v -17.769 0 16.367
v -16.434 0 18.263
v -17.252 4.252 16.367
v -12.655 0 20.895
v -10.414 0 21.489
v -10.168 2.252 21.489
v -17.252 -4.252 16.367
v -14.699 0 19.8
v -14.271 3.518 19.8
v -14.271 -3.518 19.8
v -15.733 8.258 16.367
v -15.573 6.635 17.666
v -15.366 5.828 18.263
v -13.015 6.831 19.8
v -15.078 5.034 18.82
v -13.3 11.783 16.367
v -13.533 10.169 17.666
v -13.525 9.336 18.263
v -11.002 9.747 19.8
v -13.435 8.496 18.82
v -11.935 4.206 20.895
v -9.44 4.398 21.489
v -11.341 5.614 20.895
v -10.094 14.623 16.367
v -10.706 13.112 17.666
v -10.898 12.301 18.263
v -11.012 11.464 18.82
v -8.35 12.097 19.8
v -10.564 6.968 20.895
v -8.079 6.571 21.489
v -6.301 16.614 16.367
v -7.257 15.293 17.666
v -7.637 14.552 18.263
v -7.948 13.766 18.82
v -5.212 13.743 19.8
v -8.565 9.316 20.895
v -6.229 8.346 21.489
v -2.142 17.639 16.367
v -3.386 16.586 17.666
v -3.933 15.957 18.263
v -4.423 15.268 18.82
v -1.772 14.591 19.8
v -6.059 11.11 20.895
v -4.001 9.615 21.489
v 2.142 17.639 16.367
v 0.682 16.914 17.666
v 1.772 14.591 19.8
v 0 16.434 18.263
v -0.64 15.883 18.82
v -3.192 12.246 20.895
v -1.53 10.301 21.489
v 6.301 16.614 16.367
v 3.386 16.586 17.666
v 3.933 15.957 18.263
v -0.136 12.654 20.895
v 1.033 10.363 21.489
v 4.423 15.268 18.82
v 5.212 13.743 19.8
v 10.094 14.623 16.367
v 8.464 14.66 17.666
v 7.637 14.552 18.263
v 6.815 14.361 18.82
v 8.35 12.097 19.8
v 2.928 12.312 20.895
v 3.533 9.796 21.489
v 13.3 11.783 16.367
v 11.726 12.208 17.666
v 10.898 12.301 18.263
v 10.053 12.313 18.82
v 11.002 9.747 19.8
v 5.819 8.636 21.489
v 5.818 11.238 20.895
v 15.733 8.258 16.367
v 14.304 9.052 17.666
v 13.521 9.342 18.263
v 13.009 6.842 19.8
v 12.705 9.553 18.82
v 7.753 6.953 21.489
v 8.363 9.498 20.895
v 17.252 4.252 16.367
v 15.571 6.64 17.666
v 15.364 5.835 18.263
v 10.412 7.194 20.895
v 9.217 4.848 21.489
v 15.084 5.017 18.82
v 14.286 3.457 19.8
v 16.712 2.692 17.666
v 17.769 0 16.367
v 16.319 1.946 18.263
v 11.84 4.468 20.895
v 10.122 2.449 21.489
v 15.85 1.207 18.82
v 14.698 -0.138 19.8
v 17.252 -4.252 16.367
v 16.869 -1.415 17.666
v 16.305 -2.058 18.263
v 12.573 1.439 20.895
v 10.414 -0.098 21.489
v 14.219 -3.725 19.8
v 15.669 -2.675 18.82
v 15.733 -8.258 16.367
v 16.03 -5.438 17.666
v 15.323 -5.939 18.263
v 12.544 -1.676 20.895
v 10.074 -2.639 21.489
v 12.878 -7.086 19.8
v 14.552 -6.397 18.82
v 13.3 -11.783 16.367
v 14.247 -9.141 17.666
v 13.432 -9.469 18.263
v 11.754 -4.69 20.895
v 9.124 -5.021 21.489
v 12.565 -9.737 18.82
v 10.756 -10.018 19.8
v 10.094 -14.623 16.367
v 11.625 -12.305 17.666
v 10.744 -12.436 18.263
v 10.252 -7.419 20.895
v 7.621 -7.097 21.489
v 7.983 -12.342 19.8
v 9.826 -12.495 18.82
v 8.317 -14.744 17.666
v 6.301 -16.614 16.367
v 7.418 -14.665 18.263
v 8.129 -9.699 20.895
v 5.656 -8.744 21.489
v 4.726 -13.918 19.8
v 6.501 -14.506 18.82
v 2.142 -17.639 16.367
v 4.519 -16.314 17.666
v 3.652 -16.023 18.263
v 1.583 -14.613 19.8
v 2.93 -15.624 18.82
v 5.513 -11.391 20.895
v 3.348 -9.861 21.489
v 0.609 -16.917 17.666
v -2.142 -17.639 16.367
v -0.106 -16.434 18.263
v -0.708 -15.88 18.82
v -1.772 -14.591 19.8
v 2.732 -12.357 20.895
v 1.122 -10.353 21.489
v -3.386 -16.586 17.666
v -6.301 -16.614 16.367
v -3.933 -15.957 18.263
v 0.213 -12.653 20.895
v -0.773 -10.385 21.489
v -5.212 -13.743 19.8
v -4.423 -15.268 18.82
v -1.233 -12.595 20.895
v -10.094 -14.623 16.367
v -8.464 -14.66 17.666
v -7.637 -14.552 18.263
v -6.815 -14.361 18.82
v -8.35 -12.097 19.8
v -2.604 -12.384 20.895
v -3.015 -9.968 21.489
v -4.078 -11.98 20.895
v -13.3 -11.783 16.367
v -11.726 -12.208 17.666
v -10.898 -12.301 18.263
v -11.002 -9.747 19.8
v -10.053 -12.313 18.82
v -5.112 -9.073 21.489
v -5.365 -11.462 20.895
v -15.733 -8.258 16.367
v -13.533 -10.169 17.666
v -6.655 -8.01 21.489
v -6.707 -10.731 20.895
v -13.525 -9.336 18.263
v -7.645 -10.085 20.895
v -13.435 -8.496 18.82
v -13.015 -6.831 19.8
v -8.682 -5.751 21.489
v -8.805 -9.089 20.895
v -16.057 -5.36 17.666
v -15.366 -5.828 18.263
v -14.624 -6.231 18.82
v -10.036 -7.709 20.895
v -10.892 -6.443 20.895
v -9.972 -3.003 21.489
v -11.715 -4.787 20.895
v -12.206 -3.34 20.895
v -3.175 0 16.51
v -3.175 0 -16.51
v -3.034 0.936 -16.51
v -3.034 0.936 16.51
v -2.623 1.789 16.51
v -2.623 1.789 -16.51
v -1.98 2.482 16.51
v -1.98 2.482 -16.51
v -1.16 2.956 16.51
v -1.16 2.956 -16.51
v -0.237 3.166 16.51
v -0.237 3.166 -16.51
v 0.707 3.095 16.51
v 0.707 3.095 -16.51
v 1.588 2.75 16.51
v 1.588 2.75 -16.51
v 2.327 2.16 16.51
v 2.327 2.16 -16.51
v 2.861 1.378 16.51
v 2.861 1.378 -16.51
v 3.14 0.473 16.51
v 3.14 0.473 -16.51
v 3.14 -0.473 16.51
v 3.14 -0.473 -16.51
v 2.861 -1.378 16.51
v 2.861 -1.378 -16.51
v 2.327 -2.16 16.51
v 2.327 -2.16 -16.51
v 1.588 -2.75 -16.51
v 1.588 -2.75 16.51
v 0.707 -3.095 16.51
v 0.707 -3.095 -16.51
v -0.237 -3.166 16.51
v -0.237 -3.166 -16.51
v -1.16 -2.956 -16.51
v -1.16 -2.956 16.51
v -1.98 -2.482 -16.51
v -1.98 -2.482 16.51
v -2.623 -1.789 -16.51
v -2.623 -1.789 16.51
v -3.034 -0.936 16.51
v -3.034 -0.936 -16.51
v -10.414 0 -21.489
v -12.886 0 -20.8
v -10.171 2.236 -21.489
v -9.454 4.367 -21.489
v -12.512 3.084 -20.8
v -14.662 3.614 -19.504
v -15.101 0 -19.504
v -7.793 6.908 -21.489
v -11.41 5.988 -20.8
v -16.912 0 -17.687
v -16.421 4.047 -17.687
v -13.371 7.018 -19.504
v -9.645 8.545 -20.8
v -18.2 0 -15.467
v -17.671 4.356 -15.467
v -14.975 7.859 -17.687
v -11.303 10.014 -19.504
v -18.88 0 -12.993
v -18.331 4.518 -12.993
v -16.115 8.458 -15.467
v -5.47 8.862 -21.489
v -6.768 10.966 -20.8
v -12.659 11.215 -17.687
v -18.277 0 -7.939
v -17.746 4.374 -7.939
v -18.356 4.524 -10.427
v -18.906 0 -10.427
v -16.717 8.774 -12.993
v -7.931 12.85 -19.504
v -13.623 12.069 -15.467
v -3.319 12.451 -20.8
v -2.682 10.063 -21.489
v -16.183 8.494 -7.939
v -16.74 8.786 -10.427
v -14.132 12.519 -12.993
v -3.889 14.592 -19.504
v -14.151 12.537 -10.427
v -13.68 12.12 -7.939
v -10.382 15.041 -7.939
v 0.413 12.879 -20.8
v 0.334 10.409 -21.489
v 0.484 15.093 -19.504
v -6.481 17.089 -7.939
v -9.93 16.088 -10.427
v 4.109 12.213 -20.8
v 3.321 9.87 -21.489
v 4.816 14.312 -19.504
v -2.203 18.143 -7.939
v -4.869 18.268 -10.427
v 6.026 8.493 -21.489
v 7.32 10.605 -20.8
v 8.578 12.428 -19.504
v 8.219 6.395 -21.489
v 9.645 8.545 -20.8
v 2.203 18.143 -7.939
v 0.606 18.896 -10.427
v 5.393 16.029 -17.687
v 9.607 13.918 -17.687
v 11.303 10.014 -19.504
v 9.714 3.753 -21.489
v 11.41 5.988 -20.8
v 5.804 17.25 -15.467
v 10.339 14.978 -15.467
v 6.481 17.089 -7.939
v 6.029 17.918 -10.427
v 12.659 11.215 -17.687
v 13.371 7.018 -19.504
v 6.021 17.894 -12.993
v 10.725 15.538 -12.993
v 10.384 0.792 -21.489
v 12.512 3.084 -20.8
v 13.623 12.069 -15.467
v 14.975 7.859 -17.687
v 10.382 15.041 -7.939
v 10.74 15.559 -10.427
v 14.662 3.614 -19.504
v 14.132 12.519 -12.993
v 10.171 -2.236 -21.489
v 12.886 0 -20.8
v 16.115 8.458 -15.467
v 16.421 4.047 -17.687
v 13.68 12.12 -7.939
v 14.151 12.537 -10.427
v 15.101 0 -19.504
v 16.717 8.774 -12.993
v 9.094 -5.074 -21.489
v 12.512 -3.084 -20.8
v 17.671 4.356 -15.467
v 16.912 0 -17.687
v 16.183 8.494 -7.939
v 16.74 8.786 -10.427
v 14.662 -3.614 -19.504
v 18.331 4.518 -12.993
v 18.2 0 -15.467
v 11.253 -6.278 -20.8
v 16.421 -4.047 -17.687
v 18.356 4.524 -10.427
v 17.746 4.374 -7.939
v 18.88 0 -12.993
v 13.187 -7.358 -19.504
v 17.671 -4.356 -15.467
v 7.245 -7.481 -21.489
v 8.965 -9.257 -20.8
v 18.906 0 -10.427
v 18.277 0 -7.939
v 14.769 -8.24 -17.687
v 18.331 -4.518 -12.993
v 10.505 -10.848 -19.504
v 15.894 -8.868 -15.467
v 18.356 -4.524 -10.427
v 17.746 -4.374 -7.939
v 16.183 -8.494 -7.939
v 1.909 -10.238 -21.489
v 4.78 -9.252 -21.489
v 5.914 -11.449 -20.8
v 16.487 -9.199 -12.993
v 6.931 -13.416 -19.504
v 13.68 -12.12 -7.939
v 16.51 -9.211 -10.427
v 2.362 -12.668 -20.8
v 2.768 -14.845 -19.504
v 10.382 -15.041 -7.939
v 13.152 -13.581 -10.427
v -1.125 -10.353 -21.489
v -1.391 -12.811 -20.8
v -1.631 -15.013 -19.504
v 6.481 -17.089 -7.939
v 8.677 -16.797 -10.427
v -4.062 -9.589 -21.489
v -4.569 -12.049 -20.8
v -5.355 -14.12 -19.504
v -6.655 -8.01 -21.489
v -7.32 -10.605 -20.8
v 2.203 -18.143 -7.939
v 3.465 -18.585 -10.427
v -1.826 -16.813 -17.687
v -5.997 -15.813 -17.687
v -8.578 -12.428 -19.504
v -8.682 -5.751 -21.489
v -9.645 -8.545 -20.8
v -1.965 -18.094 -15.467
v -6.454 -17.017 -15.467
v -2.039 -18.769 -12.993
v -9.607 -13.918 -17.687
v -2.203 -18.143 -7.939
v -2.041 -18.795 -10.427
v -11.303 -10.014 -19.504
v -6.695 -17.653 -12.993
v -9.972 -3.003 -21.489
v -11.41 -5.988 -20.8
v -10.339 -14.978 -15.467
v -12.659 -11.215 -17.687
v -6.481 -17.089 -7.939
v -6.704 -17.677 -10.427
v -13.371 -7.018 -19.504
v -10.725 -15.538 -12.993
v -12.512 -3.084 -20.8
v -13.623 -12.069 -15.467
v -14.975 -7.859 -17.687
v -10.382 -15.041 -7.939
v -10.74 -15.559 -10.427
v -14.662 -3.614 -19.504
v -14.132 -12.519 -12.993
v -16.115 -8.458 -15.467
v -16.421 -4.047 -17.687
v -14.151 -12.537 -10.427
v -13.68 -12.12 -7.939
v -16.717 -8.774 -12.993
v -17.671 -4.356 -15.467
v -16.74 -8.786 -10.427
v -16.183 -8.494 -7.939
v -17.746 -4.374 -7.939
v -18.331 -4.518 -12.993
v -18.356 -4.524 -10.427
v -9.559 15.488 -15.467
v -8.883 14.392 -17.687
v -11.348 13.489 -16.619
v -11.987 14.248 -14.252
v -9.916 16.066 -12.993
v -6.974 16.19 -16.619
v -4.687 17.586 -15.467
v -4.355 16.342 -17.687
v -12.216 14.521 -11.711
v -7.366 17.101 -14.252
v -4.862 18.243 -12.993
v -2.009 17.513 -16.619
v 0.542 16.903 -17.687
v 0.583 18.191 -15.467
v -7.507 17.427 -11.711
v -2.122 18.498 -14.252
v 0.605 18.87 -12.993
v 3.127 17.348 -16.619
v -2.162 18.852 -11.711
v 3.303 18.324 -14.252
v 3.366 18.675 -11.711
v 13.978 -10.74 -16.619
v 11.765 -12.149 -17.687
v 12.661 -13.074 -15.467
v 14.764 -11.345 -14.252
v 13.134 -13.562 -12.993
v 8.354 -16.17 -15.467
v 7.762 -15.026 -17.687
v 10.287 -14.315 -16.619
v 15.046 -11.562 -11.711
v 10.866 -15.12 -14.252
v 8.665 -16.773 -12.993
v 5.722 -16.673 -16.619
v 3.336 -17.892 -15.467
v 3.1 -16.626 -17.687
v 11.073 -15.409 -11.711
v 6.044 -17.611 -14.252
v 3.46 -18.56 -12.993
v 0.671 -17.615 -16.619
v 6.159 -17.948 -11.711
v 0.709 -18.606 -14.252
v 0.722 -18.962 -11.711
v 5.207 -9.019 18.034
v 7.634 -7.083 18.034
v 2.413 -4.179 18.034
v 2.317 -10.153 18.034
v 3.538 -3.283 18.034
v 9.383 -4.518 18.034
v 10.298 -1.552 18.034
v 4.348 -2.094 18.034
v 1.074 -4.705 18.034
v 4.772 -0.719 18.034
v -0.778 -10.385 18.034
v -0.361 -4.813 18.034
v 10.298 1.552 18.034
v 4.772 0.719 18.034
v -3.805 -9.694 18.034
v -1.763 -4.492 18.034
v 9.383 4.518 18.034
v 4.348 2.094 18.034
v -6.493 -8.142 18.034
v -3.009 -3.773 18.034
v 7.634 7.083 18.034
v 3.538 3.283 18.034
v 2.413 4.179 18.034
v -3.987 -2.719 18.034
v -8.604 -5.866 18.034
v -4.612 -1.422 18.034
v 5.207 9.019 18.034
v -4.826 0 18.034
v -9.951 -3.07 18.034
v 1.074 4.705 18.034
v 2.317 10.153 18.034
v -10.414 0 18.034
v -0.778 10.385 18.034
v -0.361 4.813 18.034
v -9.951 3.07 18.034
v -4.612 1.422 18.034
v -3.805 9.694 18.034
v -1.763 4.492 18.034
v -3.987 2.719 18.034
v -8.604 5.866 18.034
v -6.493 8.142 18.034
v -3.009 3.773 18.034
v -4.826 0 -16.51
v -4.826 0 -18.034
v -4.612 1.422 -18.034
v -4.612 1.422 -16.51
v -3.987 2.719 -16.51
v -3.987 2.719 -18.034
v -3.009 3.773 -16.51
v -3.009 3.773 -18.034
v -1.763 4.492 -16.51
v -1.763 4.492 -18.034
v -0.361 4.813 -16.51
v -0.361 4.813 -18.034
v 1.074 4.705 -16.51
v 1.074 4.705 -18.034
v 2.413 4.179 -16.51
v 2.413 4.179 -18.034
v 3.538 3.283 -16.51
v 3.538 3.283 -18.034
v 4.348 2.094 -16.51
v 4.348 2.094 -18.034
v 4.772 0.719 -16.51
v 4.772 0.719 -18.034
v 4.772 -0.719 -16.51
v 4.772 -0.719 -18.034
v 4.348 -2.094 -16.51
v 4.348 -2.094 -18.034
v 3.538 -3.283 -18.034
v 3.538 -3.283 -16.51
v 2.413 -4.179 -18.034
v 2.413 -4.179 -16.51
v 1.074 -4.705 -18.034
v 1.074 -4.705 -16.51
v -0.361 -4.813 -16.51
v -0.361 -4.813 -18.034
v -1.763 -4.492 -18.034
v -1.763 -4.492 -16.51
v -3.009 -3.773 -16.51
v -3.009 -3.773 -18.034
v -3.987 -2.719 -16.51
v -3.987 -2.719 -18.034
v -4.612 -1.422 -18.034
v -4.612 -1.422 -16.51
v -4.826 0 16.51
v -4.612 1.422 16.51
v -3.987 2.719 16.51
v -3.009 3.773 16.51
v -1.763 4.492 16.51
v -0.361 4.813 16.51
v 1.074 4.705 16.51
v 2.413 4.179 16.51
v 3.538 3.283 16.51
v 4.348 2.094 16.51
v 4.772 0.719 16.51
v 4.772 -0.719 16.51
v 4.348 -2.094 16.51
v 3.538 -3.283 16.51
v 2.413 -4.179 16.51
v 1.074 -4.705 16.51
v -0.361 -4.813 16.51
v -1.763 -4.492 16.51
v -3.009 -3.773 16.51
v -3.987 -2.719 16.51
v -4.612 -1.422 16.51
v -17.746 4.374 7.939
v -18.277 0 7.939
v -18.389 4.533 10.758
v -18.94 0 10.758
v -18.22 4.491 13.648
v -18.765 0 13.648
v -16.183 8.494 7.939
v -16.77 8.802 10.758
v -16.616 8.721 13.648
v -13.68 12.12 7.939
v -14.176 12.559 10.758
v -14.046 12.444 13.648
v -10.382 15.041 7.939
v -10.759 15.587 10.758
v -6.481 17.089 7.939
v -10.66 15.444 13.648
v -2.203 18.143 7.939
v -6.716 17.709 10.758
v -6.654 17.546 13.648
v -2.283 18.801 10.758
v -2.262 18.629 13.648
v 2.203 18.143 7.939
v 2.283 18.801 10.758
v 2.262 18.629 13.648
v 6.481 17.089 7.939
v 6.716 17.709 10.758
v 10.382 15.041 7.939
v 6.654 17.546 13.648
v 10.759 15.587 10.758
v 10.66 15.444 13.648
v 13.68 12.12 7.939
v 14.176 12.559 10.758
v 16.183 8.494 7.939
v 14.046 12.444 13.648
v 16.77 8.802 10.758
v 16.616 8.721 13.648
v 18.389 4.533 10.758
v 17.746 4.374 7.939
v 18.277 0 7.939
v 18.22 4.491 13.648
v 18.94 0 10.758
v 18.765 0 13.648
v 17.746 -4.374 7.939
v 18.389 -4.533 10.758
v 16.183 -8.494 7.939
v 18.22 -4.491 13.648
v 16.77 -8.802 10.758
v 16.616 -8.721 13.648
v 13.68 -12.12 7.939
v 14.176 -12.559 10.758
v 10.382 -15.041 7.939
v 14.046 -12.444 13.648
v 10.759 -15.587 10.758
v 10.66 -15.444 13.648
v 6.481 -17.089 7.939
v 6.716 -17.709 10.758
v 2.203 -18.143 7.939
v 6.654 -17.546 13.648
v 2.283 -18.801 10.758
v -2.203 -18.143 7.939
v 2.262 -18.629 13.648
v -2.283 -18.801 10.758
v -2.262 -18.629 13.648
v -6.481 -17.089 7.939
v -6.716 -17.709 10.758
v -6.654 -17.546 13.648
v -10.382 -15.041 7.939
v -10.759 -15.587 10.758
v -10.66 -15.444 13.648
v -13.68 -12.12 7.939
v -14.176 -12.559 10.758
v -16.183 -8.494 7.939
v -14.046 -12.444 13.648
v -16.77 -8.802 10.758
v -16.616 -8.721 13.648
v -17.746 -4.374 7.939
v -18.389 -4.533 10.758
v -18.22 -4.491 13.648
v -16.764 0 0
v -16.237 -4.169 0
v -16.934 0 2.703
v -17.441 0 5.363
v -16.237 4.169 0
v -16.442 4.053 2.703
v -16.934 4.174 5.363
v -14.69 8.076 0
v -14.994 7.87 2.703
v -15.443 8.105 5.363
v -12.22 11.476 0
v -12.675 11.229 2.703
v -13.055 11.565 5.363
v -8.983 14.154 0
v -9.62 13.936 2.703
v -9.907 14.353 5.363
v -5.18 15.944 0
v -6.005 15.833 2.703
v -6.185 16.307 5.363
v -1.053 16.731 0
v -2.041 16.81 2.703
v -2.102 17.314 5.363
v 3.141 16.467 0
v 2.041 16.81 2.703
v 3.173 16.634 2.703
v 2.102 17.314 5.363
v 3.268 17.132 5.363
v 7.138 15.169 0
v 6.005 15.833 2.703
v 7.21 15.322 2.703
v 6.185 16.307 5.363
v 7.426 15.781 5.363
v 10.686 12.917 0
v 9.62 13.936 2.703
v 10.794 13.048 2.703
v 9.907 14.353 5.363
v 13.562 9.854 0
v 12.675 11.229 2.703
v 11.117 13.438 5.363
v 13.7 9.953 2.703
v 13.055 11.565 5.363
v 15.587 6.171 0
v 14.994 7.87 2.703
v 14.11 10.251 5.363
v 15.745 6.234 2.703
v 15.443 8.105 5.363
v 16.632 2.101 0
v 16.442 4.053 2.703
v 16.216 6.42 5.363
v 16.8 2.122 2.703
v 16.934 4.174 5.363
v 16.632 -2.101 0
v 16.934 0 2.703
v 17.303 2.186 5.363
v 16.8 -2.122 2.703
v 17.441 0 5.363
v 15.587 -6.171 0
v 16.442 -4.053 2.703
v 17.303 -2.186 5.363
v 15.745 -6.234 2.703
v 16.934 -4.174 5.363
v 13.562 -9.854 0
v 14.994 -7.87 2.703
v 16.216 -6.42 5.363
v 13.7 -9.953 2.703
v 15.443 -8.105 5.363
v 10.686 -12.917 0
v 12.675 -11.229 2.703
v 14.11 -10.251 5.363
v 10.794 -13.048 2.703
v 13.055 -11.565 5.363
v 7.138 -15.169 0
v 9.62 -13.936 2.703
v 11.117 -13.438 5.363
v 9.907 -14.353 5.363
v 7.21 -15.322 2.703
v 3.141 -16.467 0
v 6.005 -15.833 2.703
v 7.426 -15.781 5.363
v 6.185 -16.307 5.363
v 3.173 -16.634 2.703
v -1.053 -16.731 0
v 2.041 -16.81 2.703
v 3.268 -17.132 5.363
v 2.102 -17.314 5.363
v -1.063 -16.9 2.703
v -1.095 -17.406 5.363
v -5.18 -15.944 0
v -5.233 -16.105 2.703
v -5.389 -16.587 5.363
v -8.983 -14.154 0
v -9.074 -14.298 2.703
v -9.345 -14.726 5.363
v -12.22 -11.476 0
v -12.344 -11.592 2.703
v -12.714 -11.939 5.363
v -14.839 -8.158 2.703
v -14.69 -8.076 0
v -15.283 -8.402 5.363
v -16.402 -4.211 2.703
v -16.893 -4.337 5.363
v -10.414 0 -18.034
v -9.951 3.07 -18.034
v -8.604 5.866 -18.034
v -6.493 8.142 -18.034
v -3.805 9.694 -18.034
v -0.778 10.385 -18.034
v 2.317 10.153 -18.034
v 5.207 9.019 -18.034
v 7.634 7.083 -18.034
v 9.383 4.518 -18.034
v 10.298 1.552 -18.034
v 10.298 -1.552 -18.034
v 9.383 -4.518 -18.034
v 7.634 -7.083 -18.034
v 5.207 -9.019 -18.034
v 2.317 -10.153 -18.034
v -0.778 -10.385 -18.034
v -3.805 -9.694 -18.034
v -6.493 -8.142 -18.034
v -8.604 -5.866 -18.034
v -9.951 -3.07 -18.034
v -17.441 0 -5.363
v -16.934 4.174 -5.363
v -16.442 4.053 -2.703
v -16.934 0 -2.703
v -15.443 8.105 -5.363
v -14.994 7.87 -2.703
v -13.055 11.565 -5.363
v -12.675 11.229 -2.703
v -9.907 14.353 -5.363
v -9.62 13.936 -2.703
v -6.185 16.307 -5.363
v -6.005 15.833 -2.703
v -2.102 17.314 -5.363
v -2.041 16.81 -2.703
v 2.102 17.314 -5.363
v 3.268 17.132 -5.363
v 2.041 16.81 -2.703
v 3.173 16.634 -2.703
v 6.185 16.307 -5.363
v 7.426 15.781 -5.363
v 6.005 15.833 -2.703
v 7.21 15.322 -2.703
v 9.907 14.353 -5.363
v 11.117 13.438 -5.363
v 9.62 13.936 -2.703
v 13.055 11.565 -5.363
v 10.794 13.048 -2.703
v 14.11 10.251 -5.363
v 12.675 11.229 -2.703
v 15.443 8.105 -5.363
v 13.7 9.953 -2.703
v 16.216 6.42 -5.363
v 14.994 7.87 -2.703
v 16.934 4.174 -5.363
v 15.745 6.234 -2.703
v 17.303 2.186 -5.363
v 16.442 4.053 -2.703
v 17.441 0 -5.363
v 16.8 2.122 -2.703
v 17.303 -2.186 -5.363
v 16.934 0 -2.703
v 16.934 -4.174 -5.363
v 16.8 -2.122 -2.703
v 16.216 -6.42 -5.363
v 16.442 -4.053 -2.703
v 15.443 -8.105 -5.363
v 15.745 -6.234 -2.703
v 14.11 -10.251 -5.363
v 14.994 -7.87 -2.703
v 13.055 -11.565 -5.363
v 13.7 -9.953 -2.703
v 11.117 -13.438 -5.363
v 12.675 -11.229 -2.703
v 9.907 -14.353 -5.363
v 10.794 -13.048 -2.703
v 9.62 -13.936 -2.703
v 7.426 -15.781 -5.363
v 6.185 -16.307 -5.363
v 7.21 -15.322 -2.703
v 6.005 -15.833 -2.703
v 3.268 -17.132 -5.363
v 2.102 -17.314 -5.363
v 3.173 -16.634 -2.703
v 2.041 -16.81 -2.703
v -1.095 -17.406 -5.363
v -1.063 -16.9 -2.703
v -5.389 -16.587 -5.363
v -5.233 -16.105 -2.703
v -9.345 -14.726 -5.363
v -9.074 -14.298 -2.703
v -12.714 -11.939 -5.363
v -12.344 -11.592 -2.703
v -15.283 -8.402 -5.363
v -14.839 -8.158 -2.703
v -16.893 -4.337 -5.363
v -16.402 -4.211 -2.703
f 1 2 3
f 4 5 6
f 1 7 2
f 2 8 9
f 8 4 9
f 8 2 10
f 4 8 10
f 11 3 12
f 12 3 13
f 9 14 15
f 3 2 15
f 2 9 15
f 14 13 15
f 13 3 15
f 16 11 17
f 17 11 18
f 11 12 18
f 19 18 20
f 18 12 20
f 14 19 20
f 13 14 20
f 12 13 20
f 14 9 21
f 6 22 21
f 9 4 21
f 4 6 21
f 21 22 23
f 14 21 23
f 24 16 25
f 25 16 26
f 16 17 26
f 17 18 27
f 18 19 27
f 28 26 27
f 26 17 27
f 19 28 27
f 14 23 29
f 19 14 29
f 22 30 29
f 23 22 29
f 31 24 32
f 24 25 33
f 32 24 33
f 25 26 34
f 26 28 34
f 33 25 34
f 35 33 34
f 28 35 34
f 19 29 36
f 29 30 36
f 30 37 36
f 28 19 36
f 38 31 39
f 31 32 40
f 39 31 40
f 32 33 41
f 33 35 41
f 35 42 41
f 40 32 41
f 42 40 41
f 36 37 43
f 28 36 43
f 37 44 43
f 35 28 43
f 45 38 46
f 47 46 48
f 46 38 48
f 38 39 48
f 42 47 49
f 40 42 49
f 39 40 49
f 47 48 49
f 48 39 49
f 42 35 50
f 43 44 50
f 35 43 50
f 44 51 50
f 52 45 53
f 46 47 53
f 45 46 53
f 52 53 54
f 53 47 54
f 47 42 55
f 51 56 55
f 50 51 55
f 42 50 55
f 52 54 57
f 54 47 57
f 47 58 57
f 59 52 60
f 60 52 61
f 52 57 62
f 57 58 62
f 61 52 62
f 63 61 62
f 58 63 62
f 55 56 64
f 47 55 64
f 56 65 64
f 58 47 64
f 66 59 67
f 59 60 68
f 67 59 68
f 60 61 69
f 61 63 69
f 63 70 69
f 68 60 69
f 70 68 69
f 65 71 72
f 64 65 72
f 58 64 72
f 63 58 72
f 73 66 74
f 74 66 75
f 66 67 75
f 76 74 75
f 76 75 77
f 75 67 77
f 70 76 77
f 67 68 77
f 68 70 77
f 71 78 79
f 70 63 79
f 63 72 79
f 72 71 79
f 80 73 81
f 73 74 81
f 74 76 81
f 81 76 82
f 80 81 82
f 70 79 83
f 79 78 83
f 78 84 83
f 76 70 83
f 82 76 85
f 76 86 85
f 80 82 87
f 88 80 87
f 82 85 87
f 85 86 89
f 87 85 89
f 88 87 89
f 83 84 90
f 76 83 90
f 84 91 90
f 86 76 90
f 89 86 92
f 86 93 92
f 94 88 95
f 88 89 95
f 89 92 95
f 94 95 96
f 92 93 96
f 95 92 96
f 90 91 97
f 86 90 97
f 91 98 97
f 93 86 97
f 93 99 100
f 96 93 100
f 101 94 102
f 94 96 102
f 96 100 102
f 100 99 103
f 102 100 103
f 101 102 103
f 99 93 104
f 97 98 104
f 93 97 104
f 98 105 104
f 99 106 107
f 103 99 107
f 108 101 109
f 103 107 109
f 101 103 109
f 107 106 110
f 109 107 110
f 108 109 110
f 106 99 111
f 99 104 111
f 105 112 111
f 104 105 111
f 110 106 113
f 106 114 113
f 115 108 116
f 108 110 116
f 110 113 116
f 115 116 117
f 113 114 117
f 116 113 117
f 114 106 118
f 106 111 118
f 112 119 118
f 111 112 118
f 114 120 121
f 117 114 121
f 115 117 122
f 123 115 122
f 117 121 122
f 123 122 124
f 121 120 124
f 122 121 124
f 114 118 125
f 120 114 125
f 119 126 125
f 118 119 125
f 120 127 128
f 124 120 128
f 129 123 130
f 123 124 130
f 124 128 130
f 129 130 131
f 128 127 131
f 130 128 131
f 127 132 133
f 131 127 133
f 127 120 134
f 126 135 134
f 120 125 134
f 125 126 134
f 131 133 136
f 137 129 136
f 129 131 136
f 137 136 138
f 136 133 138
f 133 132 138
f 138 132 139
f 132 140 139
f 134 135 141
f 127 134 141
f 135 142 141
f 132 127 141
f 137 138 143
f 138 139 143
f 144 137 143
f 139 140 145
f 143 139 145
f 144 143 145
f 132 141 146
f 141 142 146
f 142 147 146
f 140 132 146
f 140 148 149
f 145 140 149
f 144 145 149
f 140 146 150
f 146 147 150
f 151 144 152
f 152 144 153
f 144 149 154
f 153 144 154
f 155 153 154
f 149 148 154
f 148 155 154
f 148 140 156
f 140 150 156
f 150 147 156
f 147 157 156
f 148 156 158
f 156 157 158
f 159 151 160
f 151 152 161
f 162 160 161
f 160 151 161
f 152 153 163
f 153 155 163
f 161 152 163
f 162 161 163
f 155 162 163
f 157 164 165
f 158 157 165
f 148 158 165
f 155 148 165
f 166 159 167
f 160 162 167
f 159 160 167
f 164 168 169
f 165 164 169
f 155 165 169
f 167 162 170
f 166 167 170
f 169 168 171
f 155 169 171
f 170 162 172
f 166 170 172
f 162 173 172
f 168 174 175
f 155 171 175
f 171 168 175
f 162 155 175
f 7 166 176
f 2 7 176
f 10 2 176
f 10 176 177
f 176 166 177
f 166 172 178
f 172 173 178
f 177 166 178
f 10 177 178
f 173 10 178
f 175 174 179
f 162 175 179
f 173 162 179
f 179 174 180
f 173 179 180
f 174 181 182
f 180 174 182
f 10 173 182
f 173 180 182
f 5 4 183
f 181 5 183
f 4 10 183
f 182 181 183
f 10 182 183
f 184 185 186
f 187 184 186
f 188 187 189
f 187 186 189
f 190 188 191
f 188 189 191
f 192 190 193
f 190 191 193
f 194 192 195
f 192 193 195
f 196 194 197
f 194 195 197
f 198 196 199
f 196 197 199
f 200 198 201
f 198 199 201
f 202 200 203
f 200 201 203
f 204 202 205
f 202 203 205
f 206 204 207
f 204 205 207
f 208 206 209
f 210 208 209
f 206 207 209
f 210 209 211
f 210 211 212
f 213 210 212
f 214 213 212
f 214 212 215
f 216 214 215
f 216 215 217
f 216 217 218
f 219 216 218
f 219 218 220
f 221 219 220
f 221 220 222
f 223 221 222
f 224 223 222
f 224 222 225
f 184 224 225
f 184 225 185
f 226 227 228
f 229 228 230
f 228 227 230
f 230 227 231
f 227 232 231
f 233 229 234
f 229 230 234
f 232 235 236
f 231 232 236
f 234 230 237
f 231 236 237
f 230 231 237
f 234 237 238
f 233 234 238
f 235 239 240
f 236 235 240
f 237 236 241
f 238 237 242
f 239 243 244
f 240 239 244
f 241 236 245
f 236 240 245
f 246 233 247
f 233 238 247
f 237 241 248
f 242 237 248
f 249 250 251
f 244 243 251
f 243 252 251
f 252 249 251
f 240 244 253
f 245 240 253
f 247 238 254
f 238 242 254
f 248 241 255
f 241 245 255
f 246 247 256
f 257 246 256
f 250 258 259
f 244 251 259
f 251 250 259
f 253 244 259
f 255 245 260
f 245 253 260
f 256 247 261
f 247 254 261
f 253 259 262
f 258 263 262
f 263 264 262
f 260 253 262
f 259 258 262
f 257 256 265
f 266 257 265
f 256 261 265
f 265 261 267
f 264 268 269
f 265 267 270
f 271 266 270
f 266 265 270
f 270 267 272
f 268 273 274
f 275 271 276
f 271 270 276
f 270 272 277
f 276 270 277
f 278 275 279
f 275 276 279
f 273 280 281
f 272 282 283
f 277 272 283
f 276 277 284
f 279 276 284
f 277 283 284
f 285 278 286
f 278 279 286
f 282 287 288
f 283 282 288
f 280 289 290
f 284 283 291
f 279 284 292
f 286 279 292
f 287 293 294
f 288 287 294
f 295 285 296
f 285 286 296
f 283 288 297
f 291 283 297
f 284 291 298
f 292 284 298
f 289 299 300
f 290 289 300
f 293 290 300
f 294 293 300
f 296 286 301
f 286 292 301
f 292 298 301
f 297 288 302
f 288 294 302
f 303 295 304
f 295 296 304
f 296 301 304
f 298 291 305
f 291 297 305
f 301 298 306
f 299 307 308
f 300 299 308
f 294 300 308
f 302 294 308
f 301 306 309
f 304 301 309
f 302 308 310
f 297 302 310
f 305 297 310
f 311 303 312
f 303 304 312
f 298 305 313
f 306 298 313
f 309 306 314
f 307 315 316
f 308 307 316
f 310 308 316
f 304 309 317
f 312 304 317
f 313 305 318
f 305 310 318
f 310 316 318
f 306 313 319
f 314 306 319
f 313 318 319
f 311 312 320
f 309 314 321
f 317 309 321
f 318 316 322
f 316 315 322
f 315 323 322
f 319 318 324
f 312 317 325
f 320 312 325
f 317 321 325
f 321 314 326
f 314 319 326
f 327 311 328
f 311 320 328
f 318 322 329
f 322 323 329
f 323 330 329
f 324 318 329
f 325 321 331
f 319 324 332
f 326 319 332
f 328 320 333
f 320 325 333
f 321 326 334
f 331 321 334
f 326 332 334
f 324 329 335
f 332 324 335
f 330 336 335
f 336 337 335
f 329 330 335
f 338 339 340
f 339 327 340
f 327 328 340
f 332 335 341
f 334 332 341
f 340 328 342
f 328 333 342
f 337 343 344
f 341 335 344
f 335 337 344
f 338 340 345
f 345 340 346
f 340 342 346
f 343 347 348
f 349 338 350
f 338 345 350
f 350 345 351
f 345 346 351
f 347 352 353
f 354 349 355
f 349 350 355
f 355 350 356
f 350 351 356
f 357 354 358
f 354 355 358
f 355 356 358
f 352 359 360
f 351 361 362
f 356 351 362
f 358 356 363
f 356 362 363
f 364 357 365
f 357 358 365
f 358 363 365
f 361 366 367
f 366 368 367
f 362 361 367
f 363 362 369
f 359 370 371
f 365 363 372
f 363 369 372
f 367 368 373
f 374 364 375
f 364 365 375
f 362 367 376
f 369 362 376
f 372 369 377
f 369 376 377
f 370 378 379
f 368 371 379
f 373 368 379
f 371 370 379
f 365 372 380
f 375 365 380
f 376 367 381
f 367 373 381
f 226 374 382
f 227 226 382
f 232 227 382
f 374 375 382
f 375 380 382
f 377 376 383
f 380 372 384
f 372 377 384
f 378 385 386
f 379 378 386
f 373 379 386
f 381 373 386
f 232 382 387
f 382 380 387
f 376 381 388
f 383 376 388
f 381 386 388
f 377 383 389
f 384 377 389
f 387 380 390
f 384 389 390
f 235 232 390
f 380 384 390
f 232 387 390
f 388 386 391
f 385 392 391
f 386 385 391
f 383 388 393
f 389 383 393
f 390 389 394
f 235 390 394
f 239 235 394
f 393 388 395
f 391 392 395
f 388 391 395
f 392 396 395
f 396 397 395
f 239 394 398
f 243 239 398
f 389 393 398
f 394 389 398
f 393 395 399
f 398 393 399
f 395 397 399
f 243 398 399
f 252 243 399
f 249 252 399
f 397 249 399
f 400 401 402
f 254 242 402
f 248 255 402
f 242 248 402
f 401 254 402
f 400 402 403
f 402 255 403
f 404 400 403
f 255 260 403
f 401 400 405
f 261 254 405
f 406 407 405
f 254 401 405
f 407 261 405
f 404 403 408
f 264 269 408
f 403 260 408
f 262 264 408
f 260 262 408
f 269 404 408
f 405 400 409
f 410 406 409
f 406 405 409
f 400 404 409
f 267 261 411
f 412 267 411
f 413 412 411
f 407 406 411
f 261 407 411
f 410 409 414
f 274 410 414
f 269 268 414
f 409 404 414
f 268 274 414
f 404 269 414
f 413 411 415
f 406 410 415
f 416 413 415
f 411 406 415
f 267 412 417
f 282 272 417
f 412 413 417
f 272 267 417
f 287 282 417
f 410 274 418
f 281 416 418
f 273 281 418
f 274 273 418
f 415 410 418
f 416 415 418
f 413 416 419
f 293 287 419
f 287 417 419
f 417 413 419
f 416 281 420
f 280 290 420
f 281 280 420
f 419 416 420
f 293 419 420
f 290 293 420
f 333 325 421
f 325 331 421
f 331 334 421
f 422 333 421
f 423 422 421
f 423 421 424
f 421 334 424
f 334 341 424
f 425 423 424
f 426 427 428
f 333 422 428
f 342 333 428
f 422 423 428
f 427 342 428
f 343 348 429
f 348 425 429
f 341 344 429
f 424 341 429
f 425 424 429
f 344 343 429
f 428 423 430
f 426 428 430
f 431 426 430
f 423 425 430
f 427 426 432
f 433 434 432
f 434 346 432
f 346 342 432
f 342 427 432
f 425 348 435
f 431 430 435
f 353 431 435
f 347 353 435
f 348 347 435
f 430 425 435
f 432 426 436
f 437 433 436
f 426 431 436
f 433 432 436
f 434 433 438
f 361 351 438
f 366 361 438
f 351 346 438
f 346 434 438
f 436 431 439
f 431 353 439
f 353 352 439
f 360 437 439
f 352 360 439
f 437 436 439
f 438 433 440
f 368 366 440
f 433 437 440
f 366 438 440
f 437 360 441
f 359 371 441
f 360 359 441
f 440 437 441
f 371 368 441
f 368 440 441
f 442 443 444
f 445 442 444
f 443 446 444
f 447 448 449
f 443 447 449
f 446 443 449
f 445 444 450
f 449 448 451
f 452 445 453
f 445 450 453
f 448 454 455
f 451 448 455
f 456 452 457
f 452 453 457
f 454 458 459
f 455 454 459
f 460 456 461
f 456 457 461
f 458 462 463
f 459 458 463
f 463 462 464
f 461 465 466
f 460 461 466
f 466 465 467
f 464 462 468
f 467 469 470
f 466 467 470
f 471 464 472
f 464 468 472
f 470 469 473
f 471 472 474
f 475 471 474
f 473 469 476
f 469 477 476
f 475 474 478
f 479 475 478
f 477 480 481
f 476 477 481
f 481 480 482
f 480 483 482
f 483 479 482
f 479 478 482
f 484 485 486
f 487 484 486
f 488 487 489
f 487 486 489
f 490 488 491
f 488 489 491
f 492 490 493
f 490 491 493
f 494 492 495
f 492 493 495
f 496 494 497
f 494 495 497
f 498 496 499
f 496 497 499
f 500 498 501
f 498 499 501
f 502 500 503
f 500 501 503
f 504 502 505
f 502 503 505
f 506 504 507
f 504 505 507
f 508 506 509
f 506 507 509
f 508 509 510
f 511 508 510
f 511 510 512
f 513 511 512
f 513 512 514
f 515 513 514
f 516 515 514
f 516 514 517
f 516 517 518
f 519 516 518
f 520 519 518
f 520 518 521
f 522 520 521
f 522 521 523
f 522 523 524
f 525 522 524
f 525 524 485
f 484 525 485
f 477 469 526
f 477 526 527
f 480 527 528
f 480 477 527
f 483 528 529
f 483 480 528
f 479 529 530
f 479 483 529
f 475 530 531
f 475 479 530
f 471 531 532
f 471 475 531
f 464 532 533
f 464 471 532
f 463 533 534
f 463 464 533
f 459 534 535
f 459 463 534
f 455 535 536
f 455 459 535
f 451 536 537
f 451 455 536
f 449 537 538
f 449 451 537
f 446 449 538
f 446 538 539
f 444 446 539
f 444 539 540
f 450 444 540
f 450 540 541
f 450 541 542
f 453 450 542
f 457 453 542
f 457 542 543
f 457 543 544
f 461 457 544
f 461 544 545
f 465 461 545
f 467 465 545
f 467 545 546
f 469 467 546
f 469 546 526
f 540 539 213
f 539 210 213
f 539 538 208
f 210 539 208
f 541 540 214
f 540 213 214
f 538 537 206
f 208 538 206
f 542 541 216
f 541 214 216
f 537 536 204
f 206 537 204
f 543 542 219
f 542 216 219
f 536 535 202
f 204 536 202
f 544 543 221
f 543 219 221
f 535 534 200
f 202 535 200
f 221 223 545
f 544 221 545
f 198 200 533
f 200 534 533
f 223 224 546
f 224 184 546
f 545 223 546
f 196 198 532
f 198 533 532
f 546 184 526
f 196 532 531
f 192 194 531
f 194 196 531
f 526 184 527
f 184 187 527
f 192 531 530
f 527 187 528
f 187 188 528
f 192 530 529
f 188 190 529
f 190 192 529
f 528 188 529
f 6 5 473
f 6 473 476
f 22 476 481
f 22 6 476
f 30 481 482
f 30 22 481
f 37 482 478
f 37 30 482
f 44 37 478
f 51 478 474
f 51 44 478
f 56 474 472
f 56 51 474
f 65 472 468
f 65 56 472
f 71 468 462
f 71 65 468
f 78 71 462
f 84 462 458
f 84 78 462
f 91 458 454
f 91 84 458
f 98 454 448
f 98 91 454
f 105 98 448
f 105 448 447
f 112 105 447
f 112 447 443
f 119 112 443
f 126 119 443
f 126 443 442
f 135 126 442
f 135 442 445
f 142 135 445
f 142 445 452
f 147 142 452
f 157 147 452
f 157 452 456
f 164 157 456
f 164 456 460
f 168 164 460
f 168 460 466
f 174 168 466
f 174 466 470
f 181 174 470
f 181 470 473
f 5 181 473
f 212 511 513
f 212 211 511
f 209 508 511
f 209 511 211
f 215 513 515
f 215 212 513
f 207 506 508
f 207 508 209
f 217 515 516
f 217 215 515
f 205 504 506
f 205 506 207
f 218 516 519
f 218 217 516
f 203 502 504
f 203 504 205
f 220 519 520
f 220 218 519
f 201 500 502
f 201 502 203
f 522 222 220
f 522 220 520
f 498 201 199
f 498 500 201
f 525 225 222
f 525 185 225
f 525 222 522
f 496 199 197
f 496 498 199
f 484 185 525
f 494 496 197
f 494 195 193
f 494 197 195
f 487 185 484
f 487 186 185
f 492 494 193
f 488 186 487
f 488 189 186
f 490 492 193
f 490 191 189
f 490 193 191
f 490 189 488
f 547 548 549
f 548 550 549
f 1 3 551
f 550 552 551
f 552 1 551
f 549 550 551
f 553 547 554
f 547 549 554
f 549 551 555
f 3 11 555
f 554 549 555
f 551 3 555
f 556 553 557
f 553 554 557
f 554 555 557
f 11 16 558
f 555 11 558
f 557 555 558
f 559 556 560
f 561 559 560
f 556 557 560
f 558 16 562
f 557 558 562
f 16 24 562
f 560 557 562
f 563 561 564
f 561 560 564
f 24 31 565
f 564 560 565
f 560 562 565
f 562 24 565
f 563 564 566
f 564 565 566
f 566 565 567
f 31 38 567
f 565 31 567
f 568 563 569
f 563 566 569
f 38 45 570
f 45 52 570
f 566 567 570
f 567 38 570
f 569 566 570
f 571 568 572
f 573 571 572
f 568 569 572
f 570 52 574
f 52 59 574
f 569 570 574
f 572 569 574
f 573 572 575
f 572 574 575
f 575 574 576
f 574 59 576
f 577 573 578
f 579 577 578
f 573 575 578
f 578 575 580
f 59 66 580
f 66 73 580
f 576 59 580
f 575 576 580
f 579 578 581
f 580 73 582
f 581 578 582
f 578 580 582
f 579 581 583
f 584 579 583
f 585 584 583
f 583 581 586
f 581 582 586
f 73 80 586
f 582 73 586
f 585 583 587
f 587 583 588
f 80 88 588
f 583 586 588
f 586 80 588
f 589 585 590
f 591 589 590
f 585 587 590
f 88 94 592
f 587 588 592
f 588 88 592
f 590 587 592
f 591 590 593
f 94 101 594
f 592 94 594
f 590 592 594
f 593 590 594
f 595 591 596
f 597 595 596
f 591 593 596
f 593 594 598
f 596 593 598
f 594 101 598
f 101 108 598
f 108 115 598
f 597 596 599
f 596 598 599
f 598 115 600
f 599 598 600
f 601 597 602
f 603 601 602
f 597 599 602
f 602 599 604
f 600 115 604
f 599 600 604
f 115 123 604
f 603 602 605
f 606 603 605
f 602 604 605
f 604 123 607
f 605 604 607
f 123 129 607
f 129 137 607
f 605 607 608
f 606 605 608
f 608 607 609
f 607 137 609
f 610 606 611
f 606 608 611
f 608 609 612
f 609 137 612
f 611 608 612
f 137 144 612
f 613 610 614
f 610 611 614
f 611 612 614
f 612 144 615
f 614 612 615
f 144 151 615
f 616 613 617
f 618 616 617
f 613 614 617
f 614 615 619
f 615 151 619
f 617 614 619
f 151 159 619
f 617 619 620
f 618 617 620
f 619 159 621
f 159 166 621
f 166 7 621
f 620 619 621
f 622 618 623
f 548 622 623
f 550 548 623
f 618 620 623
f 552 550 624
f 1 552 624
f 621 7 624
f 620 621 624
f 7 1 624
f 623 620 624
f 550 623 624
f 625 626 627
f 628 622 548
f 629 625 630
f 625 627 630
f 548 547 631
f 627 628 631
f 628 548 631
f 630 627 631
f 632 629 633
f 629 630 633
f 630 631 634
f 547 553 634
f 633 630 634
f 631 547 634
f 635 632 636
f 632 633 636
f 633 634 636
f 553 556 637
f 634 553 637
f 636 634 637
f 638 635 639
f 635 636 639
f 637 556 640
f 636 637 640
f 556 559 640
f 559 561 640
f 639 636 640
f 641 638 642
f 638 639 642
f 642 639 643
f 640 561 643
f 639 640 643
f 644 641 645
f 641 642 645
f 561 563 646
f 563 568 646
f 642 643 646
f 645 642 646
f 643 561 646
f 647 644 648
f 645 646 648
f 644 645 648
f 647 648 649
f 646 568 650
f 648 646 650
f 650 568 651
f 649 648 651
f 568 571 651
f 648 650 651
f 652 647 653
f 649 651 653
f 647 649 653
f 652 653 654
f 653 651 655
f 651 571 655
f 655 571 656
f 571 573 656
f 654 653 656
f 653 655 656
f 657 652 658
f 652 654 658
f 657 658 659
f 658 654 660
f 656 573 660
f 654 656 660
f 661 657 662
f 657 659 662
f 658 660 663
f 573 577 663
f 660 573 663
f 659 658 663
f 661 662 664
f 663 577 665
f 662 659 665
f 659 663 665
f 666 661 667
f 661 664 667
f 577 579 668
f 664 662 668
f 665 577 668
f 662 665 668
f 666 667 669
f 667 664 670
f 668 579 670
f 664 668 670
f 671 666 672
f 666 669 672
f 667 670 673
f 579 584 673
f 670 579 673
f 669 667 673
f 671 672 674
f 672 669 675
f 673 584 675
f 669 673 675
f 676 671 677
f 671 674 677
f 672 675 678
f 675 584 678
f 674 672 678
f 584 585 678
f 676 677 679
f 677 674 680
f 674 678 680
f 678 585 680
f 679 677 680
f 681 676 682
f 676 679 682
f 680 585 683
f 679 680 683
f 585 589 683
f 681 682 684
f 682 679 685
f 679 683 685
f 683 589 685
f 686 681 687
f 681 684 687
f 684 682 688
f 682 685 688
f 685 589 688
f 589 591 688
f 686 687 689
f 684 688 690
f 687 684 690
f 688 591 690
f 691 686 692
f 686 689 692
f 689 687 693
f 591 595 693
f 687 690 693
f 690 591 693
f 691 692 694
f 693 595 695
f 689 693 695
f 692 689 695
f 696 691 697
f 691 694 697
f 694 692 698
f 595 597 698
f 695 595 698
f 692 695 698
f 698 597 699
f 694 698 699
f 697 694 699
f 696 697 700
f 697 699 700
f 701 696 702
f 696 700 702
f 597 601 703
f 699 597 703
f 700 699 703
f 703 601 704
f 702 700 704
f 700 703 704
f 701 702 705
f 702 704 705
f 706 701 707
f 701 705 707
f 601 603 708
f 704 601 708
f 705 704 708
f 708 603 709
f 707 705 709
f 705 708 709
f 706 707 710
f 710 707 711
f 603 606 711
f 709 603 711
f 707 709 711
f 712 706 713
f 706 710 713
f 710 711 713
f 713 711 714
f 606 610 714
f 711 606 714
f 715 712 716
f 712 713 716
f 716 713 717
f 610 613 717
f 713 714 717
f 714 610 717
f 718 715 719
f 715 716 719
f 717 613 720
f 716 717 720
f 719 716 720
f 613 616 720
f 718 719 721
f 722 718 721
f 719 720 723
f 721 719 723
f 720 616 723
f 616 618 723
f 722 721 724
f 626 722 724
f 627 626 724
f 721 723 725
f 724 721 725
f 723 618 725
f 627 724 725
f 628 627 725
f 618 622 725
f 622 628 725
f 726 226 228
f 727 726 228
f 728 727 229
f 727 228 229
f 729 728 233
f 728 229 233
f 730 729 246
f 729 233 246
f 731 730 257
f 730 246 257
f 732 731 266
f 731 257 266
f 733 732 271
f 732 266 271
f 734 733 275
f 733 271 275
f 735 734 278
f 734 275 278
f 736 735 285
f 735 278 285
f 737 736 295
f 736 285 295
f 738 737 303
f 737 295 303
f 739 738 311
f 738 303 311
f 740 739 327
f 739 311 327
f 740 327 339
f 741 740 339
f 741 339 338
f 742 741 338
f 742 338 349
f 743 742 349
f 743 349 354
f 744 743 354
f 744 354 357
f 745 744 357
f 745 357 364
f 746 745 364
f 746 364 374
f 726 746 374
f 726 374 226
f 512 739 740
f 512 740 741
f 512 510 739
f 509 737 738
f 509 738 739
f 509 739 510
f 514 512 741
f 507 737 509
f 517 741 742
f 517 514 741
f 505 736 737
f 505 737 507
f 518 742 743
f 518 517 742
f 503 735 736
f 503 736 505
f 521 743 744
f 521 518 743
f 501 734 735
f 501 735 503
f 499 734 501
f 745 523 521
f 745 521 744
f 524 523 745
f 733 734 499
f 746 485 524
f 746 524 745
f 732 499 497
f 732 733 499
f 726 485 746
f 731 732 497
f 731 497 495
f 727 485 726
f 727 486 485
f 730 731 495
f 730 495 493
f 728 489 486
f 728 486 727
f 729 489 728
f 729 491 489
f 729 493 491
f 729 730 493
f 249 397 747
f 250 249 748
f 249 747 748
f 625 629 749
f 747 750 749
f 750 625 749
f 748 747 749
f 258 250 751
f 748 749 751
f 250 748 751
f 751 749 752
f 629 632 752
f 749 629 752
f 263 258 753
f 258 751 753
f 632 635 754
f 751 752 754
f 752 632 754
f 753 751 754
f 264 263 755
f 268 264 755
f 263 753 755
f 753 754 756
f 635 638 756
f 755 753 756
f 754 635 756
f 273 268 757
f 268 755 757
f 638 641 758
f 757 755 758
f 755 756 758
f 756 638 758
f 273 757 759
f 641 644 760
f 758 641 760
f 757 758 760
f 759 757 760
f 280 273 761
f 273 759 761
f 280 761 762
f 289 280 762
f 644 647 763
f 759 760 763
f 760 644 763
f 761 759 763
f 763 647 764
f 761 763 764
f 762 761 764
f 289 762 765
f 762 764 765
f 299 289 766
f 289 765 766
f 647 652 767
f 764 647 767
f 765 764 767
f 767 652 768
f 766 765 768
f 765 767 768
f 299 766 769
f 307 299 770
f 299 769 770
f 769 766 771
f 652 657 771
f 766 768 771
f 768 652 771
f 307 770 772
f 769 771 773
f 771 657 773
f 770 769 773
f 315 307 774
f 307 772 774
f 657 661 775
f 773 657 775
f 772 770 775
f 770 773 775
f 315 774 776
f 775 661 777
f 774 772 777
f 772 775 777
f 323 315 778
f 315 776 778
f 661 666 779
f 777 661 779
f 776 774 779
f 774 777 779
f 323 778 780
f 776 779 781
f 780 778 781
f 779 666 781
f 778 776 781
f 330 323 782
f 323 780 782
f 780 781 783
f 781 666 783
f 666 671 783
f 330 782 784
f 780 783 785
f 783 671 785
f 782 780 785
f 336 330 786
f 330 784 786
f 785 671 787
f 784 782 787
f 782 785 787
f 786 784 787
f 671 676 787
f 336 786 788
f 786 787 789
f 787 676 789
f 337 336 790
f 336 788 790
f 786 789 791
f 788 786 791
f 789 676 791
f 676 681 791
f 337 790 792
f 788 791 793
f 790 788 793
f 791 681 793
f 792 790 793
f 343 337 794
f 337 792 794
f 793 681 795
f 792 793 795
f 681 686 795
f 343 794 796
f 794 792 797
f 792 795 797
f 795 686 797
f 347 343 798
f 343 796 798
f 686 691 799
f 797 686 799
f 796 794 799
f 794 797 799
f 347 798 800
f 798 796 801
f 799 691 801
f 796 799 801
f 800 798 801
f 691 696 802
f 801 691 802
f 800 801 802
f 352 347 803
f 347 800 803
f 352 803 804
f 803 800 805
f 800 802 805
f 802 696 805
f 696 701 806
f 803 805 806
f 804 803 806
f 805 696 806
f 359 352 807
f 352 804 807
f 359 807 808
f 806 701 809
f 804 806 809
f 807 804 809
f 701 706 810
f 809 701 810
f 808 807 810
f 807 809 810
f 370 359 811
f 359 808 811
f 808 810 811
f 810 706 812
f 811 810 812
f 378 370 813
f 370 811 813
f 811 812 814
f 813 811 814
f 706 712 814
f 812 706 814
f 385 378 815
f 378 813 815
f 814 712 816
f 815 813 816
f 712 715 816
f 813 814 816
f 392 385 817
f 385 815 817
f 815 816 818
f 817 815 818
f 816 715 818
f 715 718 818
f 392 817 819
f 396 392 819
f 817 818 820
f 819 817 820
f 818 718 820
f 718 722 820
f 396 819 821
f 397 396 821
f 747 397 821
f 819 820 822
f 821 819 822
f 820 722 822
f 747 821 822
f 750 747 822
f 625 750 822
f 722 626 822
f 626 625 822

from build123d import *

# Parameters (mm, degrees)
SKETCH2_R          = 10.414
SKETCH2_R_2        = 4.826
CUT_EXTRUDE1_DEPTH = 3.556
SKETCH2_3_R        = 4.826
SKETCH2_3_R_2      = 3.175
CUT_EXTRUDE2_DEPTH = 5.08
SKETCH2_4_R        = 3.175
CUT_EXTRUDE3_DEPTH = 51.839793437


with BuildPart() as part:
    # Sketch1 → Revolve1 (revolve)
    with BuildSketch(Plane(origin=(0, 0, 0), x_dir=(1, 0, 0), z_dir=(0, 1, 0))):
        with BuildLine():
            Line((-8.99509488, -21.59), (0, -21.59))
            Line((0, -21.59), (0, 21.59))
            Line((0, 21.59), (-8.99509488, 21.59))
            ThreePointArc((-8.99509488, 21.59), (-17.248826294, 17.221029702), (-18.27665112, 7.939027771))
            ThreePointArc((-18.27665112, 7.939027771), (-17.145533974, 4.040924256), (-16.764, 0))
            ThreePointArc((-16.764, 0), (-17.145533974, -4.040924256), (-18.27665112, -7.939027771))
            ThreePointArc((-18.27665112, -7.939027771), (-18.957860852, -12.209538391), (-17.768742698, -16.367338972))
            ThreePointArc((-17.768742698, -16.367338972), (-14.100314862, -20.185516743), (-8.99509488, -21.59))
        make_face()
    revolve(axis=Axis((0, 0, 21.59), (0, 0, -1)))

    # Sketch2 → Cut-Extrude1 (cut)
    with BuildSketch(Plane(origin=(0, 0, -21.59), x_dir=(-1, 0, 0), z_dir=(0, 0, -1))):
        Circle(SKETCH2_R)
        Circle(SKETCH2_R_2, mode=Mode.SUBTRACT)
    cut_extrude1 = extrude(amount=-CUT_EXTRUDE1_DEPTH, mode=Mode.SUBTRACT)

    # Sketch2<3> → Cut-Extrude2 (cut)
    with BuildSketch(Plane(origin=(0, 0, -21.59), x_dir=(-1, 0, 0), z_dir=(0, 0, -1))):
        Circle(SKETCH2_3_R)
        Circle(SKETCH2_3_R_2, mode=Mode.SUBTRACT)
    cut_extrude2 = extrude(amount=-CUT_EXTRUDE2_DEPTH, mode=Mode.SUBTRACT)

    # Sketch2<4> → Cut-Extrude3 (cut, through all)
    with BuildSketch(Plane(origin=(0, 0, -21.59), x_dir=(-1, 0, 0), z_dir=(0, 0, -1))):
        Circle(SKETCH2_4_R)
    extrude(amount=-CUT_EXTRUDE3_DEPTH, mode=Mode.SUBTRACT)

    # Mirror1: Cut-Extrude1, Cut-Extrude2 across plane
    add(cut_extrude1.mirror(Plane.XY), mode=Mode.SUBTRACT)
    add(cut_extrude2.mirror(Plane.XY), mode=Mode.SUBTRACT)


solid = part.part
